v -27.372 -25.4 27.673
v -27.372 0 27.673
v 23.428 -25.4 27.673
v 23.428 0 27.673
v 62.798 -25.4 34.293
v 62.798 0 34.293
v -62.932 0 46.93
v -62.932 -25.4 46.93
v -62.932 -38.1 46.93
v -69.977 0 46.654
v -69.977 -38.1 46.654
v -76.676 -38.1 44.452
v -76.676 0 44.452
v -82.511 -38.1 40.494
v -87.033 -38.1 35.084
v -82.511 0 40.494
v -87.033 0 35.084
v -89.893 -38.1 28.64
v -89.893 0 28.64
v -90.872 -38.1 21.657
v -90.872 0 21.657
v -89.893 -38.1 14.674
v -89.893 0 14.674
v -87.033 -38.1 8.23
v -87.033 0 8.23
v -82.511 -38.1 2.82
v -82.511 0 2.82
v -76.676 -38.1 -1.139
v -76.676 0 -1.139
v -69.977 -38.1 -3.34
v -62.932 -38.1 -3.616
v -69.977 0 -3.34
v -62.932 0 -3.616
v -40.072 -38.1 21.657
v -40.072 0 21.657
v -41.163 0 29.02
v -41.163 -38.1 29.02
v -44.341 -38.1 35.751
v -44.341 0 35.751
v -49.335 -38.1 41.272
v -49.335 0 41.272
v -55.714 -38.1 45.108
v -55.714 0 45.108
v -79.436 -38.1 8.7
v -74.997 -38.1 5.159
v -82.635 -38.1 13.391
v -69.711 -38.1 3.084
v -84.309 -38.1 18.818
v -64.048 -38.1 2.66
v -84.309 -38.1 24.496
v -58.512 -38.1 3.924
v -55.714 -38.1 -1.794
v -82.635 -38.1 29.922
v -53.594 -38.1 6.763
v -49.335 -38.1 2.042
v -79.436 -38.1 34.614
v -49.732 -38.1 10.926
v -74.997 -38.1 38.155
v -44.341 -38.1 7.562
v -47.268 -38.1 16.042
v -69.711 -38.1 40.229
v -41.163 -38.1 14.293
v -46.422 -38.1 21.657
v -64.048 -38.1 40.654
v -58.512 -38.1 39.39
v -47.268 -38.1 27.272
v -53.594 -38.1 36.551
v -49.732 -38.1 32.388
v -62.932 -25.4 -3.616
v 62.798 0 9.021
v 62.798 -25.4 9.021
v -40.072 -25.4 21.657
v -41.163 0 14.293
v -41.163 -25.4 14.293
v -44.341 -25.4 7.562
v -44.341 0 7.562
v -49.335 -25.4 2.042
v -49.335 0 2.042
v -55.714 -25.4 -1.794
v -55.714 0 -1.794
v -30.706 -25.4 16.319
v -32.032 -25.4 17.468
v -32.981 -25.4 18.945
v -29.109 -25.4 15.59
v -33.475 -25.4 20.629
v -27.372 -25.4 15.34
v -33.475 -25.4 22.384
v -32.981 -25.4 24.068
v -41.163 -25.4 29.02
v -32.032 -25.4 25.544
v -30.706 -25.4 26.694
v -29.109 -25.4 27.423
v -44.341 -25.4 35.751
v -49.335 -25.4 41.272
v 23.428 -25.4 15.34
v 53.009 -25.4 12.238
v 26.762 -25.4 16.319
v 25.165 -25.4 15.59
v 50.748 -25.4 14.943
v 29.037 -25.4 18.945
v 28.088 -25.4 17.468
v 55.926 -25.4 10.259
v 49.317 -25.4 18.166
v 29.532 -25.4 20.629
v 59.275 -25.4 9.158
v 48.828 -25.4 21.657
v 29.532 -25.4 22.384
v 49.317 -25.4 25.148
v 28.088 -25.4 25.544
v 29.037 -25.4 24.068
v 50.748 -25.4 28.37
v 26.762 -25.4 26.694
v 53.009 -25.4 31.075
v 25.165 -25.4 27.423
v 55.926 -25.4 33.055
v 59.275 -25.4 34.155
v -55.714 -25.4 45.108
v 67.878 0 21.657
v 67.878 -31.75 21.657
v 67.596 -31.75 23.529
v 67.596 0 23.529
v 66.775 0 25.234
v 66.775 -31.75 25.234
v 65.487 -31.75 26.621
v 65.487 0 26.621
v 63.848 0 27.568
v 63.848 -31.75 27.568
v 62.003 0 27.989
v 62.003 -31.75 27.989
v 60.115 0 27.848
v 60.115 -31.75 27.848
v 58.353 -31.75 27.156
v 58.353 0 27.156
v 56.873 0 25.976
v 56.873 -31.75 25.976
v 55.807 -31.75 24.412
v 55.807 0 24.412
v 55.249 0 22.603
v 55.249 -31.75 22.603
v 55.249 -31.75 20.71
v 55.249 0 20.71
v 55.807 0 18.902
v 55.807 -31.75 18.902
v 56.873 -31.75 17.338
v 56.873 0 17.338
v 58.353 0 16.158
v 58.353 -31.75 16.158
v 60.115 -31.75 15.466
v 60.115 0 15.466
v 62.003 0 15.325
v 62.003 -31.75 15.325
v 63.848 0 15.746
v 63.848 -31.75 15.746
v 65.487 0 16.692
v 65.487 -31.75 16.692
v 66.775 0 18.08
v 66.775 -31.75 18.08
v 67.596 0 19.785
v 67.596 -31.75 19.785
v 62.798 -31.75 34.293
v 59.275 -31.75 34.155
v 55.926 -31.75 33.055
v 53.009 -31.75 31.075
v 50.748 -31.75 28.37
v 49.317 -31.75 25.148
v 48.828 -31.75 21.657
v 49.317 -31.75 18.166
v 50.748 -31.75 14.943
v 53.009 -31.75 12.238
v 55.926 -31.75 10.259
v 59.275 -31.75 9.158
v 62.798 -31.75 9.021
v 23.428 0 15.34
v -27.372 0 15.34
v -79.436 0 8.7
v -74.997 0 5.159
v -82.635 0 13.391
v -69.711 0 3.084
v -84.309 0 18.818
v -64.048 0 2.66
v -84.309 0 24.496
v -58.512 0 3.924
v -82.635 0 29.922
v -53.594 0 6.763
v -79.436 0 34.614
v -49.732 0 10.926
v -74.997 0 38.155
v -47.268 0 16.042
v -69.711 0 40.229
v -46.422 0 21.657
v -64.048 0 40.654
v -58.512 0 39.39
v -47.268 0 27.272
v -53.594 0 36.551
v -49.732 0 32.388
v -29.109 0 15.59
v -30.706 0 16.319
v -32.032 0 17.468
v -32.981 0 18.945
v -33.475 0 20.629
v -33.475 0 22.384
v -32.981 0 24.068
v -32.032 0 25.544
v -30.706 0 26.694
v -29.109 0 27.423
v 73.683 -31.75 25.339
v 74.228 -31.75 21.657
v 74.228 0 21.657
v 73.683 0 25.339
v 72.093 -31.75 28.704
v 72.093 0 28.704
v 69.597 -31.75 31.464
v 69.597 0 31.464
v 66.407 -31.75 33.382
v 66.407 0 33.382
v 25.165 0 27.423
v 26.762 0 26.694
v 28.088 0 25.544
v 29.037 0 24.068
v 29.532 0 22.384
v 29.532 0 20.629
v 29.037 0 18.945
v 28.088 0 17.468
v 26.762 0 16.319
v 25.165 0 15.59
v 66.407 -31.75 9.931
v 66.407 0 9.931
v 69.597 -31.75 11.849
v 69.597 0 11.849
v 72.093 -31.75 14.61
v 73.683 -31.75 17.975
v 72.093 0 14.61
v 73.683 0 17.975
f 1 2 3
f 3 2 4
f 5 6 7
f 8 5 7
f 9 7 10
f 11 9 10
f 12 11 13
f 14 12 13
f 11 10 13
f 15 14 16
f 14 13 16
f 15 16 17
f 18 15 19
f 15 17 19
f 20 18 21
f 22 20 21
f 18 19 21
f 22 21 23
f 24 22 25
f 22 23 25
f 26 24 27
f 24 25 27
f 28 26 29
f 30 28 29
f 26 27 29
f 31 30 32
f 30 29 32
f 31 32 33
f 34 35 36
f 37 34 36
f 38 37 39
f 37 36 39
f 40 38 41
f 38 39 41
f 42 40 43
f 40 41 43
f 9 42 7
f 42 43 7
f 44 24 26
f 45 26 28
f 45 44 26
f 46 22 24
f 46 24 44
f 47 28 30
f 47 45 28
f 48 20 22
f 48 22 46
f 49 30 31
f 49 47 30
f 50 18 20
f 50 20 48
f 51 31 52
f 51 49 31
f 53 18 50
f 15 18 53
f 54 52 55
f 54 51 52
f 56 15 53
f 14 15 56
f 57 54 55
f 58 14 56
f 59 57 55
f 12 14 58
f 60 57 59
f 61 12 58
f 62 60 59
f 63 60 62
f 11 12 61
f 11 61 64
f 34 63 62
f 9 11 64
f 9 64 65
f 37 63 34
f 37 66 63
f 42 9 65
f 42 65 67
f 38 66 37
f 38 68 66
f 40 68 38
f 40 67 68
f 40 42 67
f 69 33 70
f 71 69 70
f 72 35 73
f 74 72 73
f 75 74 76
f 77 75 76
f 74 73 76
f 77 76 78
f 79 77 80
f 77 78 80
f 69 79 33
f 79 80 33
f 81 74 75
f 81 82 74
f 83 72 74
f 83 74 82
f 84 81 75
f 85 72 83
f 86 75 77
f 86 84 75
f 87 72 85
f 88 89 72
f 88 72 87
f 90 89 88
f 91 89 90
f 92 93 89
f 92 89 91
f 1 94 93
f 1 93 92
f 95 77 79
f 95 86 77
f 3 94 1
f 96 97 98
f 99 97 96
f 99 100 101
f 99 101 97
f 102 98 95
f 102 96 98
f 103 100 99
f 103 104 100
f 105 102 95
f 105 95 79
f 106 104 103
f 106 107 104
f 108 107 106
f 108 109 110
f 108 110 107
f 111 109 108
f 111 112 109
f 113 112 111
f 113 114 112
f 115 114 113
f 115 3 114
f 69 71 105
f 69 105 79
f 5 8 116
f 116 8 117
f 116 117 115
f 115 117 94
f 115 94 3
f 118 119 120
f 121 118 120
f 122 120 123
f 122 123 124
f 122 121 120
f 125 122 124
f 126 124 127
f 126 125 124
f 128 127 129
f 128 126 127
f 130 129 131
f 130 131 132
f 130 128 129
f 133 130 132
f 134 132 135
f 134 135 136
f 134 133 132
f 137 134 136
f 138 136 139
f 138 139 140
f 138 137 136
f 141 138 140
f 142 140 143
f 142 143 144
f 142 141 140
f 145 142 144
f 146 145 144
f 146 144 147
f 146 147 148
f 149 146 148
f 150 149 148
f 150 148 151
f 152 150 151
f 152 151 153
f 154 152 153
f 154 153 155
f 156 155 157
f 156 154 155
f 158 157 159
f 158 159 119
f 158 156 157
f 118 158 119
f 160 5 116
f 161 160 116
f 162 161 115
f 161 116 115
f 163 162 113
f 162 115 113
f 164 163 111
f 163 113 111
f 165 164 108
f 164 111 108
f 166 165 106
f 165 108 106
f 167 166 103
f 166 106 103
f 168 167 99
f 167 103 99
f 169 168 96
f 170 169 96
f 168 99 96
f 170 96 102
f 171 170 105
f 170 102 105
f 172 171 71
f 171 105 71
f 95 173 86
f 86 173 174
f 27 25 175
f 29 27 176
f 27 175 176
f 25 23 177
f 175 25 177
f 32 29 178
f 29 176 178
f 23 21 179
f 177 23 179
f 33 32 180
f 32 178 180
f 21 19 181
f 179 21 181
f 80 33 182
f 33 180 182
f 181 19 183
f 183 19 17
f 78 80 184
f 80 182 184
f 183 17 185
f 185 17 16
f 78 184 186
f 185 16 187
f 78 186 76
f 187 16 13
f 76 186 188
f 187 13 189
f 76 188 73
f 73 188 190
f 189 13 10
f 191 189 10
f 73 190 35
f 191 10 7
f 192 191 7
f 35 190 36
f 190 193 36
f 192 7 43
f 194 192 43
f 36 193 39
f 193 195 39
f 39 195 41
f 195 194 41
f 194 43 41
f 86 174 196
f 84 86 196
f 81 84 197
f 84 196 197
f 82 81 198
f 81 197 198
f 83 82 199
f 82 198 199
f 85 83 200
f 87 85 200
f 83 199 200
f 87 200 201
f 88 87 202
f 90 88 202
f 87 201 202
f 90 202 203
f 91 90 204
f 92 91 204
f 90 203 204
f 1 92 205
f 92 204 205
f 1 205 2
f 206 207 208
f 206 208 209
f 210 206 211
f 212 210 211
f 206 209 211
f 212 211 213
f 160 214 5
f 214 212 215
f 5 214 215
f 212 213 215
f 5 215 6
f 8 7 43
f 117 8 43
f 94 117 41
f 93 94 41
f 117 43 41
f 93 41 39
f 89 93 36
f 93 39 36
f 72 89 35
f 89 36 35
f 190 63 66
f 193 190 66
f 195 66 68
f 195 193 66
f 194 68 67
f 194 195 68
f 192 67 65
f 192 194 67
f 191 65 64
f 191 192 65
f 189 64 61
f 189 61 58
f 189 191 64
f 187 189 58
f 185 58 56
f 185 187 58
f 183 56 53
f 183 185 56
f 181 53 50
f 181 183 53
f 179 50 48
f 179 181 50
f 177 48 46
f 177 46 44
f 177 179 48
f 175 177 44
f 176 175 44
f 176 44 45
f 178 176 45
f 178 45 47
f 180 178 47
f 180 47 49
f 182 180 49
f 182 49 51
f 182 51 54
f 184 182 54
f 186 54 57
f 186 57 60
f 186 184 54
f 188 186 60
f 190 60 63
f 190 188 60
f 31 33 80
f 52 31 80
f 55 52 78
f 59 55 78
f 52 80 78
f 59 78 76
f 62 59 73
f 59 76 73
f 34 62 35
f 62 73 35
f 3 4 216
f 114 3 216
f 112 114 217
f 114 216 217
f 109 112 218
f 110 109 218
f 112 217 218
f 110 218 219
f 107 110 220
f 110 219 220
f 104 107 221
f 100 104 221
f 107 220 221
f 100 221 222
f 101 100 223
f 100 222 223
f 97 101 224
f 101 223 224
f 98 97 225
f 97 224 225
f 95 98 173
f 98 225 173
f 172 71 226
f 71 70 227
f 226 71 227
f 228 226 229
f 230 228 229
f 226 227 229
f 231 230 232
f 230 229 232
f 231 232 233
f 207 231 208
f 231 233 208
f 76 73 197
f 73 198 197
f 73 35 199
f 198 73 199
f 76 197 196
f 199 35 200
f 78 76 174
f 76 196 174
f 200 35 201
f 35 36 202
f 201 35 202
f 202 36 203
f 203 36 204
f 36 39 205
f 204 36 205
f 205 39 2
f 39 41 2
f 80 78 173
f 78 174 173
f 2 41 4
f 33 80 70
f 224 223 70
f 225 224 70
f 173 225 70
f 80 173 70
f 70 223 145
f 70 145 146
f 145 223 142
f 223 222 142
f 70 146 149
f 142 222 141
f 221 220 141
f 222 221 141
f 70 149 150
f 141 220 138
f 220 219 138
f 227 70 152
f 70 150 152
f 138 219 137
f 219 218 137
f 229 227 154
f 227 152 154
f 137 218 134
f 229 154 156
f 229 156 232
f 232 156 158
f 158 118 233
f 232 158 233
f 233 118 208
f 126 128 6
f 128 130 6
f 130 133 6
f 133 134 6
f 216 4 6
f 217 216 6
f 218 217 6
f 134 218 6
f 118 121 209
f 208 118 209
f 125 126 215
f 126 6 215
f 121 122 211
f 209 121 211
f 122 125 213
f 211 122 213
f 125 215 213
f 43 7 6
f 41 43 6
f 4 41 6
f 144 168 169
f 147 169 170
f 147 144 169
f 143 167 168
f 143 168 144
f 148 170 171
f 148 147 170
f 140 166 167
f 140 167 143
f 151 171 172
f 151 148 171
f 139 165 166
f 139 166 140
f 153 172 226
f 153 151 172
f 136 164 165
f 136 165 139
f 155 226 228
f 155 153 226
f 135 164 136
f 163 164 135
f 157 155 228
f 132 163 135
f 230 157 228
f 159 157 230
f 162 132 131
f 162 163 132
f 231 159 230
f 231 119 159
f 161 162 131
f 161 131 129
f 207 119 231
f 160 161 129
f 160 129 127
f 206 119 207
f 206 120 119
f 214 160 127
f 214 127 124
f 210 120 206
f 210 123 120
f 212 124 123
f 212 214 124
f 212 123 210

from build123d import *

# Parameters (mm, degrees)
F0_R     = 19.05
F1_DEPTH = 38.1
F2_DEPTH = 25.4
F0_R_2   = 6.35
F3_DEPTH = 31.75


with BuildPart() as f1:
    # F0 (on Front) → F1 (new body)
    with BuildSketch(Plane.XZ):
        with BuildLine():
            ThreePointArc((-62.931842, -3.615838), (-46.634698, 4.618005), (-40.071842, 21.656843))
            ThreePointArc((-40.071842, 21.656843), (-46.634698, 38.695681), (-62.931842, 46.929524))
            ThreePointArc((-62.931842, 46.929524), (-90.871842, 21.656843), (-62.931842, -3.615838))
        make_face()
        with Locations((-65.471842, 21.656843)):
            Circle(F0_R, mode=Mode.SUBTRACT)
    extrude(amount=F1_DEPTH)


with BuildPart() as f2:
    # F0 (on Front) → F2 (new body)
    with BuildSketch(Plane.XZ):
        with BuildLine():
            ThreePointArc((-62.931842, 46.929524), (-46.634698, 38.695681), (-40.071842, 21.656843))
            ThreePointArc((-40.071842, 21.656843), (-46.634698, 4.618005), (-62.931842, -3.615838))
            Line((-62.931842, -3.615838), (62.798158, 9.020502))
            ThreePointArc((62.798158, 9.020502), (48.828158, 21.656843), (62.798158, 34.293183))
            Line((62.798158, 34.293183), (-62.931842, 46.929524))
        make_face()
        with BuildLine():
            ThreePointArc((-27.371842, 15.340263), (-33.538027, 21.506447), (-27.371842, 27.672632))
            Line((-27.371842, 27.672632), (23.428158, 27.672632))
            ThreePointArc((23.428158, 27.672632), (29.594342, 21.506447), (23.428158, 15.340263))
            Line((23.428158, 15.340263), (-27.371842, 15.340263))
        make_face(mode=Mode.SUBTRACT)
    extrude(amount=F2_DEPTH)

    # F0 (on Front) → F3 (join)
    with BuildSketch(Plane.XZ):
        with BuildLine():
            ThreePointArc((74.228158, 21.656843), (70.94673, 30.176262), (62.798158, 34.293183))
            ThreePointArc((62.798158, 34.293183), (48.828158, 21.656843), (62.798158, 9.020502))
            ThreePointArc((62.798158, 9.020502), (70.94673, 13.137424), (74.228158, 21.656843))
        make_face()
        with Locations((61.528158, 21.656843)):
            Circle(F0_R_2, mode=Mode.SUBTRACT)
    extrude(amount=F3_DEPTH)


solid = Compound([f1.part, f2.part])
